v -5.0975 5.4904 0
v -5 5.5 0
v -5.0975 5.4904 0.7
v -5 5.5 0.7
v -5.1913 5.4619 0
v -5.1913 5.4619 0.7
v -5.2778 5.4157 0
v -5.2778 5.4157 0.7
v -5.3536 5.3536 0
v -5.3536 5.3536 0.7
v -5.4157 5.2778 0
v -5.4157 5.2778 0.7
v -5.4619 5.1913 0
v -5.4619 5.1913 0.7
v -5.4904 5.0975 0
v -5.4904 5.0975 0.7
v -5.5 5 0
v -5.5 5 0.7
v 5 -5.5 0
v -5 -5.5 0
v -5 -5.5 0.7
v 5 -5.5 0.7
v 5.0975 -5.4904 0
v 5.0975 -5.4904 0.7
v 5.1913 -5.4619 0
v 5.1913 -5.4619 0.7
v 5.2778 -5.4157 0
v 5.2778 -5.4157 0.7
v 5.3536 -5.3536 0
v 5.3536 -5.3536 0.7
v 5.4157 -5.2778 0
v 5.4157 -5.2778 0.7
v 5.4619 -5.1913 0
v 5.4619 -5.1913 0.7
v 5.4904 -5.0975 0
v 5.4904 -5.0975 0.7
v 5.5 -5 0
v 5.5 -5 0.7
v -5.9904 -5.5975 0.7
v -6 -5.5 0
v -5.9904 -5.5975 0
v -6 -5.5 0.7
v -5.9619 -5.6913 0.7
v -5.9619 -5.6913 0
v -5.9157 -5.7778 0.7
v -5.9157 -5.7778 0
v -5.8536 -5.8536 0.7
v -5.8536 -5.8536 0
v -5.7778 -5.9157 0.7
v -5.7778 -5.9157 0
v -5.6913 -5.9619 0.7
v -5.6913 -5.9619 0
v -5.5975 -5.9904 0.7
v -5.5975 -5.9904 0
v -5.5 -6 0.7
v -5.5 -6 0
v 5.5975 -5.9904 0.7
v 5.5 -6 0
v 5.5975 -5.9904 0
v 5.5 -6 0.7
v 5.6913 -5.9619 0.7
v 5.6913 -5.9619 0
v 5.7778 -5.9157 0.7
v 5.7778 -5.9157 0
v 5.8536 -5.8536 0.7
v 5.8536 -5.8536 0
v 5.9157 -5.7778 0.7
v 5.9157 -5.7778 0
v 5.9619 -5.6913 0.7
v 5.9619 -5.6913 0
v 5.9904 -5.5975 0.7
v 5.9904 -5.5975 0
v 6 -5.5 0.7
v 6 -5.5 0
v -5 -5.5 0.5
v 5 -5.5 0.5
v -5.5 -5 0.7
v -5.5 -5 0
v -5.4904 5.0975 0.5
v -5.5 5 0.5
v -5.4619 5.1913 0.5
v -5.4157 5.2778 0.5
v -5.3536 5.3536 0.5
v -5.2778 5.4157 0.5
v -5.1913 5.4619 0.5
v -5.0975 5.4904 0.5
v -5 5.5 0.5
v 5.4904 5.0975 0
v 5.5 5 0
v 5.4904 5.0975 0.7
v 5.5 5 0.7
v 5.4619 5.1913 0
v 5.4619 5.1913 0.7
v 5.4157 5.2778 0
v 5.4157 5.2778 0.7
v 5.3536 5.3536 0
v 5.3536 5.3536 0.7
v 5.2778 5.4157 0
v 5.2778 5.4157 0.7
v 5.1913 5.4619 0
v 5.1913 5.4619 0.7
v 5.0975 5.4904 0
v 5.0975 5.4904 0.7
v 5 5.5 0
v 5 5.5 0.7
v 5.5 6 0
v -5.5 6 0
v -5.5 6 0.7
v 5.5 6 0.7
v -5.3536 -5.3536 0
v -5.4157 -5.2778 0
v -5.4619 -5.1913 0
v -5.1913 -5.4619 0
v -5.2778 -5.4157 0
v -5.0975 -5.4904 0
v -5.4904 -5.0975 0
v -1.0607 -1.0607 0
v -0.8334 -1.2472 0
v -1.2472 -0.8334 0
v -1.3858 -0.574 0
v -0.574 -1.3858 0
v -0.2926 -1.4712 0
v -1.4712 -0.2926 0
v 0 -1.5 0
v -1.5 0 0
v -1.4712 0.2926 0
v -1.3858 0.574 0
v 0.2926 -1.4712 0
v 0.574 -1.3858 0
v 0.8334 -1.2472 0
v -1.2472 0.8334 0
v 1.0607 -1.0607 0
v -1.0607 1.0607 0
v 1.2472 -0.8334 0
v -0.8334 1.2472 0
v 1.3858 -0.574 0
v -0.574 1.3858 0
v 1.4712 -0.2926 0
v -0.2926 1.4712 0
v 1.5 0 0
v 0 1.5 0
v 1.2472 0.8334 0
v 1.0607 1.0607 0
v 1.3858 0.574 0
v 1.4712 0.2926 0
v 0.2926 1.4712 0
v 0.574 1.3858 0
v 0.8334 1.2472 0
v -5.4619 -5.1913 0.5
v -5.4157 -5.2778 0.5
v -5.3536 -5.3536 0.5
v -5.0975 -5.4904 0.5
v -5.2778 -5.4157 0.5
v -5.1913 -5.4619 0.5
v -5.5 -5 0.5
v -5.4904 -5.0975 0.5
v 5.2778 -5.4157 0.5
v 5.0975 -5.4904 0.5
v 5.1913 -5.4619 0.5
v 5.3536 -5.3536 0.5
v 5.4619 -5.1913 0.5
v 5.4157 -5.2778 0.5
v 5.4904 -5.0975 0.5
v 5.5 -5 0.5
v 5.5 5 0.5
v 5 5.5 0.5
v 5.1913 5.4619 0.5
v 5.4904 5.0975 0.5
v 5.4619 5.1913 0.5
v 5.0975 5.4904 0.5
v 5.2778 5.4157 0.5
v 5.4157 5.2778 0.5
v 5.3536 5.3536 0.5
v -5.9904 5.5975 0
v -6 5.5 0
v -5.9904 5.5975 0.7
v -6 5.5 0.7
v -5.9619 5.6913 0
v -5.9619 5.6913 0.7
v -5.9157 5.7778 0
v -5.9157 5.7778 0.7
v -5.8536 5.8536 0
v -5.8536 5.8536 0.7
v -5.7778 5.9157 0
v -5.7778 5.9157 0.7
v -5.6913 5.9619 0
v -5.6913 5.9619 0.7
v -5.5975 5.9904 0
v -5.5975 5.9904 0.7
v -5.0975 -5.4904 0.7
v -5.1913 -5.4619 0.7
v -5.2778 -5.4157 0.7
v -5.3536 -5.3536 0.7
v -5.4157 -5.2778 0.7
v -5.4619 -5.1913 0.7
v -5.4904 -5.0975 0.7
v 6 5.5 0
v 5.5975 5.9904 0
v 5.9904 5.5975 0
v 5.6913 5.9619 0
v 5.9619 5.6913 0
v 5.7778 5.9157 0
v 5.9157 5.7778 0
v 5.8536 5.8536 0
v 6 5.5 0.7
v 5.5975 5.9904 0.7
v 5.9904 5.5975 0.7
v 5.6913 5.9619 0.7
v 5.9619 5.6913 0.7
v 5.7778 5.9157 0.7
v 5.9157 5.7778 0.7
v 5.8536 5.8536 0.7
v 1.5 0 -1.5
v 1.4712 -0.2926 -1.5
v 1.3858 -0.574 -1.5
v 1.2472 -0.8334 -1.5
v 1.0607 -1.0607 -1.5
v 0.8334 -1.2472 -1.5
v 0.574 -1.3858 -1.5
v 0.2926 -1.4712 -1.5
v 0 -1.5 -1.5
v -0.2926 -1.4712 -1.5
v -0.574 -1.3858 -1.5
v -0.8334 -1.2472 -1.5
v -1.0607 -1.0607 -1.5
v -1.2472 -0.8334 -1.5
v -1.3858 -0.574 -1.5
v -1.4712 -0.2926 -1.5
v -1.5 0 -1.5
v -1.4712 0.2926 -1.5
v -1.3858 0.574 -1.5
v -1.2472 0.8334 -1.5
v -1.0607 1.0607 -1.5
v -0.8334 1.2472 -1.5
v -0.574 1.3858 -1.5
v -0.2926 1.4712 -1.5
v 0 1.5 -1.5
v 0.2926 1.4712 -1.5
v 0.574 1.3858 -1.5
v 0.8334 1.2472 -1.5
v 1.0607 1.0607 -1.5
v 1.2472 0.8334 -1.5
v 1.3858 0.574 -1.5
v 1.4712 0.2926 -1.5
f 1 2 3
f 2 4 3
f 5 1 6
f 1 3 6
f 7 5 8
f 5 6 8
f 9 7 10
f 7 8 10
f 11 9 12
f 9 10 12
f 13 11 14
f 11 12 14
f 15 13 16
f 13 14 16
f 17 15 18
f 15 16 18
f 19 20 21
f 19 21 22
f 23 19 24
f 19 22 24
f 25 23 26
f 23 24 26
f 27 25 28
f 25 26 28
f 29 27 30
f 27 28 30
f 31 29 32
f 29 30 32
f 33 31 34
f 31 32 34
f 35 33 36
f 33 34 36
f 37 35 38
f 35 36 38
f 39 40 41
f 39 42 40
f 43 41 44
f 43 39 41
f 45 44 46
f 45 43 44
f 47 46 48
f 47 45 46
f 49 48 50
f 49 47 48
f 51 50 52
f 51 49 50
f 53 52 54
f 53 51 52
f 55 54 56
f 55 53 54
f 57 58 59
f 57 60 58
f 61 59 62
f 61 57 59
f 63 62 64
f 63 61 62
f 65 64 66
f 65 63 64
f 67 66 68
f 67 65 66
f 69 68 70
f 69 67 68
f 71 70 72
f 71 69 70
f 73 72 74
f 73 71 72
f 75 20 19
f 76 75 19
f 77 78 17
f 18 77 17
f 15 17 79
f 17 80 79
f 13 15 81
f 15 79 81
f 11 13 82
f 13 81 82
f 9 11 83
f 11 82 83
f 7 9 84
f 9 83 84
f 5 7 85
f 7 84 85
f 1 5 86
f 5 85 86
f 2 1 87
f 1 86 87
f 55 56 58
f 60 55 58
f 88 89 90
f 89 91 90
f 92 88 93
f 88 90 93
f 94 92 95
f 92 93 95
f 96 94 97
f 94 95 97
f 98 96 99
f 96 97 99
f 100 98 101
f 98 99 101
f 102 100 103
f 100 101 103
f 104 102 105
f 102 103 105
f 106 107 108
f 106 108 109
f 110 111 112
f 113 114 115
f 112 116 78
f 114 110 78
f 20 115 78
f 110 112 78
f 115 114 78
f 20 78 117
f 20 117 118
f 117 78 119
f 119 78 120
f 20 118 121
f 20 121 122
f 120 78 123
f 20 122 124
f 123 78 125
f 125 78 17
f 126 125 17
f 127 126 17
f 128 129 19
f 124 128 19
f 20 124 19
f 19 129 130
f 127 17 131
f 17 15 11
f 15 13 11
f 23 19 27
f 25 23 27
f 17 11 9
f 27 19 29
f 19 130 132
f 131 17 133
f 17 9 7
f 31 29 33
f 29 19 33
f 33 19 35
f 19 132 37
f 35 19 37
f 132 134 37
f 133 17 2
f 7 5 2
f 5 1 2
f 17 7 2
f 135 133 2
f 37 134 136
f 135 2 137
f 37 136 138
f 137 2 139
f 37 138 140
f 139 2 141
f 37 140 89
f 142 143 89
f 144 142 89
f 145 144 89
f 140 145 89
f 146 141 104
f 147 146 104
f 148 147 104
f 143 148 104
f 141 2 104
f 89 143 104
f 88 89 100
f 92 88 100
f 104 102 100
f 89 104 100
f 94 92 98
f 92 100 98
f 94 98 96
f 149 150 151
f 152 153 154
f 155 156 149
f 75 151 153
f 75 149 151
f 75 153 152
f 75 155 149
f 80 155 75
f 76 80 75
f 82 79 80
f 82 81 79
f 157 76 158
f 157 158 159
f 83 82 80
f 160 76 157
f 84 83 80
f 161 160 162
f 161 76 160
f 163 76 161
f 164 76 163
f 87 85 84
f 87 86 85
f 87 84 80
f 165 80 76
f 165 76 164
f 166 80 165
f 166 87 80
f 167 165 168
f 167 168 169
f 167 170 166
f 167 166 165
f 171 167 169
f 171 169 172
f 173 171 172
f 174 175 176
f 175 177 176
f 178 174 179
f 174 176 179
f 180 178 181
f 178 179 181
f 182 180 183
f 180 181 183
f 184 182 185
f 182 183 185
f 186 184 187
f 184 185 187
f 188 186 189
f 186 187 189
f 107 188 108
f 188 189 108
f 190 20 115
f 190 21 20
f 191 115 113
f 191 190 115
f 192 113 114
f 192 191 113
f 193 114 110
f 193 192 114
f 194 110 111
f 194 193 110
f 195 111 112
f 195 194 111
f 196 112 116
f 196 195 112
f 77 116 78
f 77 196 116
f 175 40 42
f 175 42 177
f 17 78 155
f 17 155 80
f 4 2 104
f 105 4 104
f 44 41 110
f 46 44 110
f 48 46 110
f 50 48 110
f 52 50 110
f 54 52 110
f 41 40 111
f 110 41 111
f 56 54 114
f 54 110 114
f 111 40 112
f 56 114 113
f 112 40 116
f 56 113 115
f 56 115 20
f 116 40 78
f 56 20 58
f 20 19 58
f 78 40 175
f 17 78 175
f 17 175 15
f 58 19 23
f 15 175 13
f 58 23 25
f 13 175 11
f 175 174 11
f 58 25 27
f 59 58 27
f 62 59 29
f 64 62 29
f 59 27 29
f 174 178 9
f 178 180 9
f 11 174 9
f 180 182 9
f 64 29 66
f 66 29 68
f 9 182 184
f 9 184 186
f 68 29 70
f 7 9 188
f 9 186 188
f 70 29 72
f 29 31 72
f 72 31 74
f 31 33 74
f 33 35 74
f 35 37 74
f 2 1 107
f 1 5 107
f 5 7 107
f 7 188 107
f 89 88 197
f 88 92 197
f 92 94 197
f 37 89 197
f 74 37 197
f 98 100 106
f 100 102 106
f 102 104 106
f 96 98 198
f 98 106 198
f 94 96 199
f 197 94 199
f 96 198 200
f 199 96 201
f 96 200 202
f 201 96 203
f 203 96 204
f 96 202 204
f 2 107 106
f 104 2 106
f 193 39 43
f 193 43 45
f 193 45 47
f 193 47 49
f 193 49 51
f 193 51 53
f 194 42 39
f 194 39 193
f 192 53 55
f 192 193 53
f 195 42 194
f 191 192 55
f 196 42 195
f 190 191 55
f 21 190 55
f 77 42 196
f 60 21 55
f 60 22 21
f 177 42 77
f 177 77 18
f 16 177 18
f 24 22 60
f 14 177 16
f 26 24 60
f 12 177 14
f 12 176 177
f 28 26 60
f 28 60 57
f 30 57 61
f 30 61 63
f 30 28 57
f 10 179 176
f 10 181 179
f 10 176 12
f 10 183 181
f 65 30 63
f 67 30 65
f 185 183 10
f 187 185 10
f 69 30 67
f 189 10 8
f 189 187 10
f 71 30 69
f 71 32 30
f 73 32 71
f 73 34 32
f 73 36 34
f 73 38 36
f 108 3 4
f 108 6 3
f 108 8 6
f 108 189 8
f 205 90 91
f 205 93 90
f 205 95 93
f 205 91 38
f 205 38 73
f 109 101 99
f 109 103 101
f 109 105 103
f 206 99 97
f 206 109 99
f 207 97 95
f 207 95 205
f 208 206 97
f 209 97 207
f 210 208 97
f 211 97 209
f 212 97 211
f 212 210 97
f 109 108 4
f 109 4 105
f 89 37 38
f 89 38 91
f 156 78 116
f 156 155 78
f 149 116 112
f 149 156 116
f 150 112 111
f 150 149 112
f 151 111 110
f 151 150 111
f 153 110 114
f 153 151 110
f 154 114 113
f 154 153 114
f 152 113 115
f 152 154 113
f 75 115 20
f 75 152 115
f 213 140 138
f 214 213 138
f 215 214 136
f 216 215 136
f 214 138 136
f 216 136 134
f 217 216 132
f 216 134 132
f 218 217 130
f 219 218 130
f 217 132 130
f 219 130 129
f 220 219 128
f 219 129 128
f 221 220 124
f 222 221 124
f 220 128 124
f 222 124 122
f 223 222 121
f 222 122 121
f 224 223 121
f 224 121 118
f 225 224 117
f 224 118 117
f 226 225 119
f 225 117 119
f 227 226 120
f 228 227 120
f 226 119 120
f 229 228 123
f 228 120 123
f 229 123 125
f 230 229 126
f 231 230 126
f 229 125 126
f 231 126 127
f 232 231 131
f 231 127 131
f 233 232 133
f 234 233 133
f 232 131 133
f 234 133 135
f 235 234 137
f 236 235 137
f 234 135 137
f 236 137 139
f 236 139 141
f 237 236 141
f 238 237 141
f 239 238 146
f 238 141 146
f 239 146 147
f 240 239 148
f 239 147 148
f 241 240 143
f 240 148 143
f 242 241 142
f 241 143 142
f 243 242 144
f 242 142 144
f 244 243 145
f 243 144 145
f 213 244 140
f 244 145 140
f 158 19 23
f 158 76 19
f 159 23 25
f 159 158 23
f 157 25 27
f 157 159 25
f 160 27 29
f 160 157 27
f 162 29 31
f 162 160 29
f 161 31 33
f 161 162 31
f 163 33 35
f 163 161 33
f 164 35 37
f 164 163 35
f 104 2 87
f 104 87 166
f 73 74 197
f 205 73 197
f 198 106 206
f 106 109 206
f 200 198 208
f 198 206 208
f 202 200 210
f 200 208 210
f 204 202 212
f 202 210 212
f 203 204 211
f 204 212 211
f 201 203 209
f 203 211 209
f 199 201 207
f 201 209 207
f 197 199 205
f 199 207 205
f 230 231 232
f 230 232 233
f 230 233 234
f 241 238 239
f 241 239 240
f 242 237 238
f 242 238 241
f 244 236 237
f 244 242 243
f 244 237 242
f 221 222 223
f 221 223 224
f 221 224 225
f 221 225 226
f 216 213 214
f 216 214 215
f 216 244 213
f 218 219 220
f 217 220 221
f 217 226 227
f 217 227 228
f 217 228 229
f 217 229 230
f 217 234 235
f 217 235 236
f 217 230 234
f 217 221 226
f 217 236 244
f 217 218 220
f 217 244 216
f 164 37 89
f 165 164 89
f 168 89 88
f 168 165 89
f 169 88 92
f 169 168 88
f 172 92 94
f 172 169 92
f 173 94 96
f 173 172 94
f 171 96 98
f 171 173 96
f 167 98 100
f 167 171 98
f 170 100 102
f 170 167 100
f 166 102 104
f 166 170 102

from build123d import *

# Parameters (mm, degrees)
SKETCH003_W   = 12
SKETCH003_H   = 12
SKETCH003_W_2 = 11
SKETCH003_H_2 = 11
PAD002_DEPTH  = 0.7
FILLET001_R   = 0.5
SKETCH004_W   = 11
SKETCH004_H   = 11
PAD_DEPTH     = 0.5
FILLET_R      = 0.5
SKETCH_R      = 1.5
PAD003_DEPTH  = 1.5


with BuildPart() as body01:
    # Sketch003 → Pad002 (new body)
    with BuildSketch(Plane.XY):
        Rectangle(SKETCH003_W, SKETCH003_H)
        Rectangle(SKETCH003_W_2, SKETCH003_H_2, mode=Mode.SUBTRACT)
    extrude(amount=PAD002_DEPTH)

    # Fillet001
    fillet001_edges = [body01.edges().sort_by_distance(p)[0] for p in [
        (6, 6, 0.35),
        (5.5, 5.5, 0.35),
        (-5.5, 5.5, 0.35),
        (-6, 6, 0.35),
        (-5.5, -5.5, 0.35),
        (-6, -6, 0.35),
        (5.5, -5.5, 0.35),
        (6, -6, 0.35),
    ]]
    fillet(fillet001_edges, radius=FILLET001_R)


with BuildPart() as body:
    # Sketch004 → Pad (new body)
    with BuildSketch(Plane.XY):
        Rectangle(SKETCH004_W, SKETCH004_H)
    extrude(amount=PAD_DEPTH)

    # Fillet
    fillet_edges = [body.edges().sort_by_distance(p)[0] for p in [
        (-5.5, 5.5, 0.25),
        (5.5, 5.5, 0.25),
        (5.5, -5.5, 0.25),
        (-5.5, -5.5, 0.25),
    ]]
    fillet(fillet_edges, radius=FILLET_R)

    # Sketch (on Face2 of Fillet) → Pad003 (join)
    with BuildSketch(Plane(origin=(0, 0, 0), x_dir=(1, 0, 0), z_dir=(0, 0, -1))):
        Circle(SKETCH_R)
    extrude(amount=PAD003_DEPTH)


solid = Compound([body01.part, body.part])
